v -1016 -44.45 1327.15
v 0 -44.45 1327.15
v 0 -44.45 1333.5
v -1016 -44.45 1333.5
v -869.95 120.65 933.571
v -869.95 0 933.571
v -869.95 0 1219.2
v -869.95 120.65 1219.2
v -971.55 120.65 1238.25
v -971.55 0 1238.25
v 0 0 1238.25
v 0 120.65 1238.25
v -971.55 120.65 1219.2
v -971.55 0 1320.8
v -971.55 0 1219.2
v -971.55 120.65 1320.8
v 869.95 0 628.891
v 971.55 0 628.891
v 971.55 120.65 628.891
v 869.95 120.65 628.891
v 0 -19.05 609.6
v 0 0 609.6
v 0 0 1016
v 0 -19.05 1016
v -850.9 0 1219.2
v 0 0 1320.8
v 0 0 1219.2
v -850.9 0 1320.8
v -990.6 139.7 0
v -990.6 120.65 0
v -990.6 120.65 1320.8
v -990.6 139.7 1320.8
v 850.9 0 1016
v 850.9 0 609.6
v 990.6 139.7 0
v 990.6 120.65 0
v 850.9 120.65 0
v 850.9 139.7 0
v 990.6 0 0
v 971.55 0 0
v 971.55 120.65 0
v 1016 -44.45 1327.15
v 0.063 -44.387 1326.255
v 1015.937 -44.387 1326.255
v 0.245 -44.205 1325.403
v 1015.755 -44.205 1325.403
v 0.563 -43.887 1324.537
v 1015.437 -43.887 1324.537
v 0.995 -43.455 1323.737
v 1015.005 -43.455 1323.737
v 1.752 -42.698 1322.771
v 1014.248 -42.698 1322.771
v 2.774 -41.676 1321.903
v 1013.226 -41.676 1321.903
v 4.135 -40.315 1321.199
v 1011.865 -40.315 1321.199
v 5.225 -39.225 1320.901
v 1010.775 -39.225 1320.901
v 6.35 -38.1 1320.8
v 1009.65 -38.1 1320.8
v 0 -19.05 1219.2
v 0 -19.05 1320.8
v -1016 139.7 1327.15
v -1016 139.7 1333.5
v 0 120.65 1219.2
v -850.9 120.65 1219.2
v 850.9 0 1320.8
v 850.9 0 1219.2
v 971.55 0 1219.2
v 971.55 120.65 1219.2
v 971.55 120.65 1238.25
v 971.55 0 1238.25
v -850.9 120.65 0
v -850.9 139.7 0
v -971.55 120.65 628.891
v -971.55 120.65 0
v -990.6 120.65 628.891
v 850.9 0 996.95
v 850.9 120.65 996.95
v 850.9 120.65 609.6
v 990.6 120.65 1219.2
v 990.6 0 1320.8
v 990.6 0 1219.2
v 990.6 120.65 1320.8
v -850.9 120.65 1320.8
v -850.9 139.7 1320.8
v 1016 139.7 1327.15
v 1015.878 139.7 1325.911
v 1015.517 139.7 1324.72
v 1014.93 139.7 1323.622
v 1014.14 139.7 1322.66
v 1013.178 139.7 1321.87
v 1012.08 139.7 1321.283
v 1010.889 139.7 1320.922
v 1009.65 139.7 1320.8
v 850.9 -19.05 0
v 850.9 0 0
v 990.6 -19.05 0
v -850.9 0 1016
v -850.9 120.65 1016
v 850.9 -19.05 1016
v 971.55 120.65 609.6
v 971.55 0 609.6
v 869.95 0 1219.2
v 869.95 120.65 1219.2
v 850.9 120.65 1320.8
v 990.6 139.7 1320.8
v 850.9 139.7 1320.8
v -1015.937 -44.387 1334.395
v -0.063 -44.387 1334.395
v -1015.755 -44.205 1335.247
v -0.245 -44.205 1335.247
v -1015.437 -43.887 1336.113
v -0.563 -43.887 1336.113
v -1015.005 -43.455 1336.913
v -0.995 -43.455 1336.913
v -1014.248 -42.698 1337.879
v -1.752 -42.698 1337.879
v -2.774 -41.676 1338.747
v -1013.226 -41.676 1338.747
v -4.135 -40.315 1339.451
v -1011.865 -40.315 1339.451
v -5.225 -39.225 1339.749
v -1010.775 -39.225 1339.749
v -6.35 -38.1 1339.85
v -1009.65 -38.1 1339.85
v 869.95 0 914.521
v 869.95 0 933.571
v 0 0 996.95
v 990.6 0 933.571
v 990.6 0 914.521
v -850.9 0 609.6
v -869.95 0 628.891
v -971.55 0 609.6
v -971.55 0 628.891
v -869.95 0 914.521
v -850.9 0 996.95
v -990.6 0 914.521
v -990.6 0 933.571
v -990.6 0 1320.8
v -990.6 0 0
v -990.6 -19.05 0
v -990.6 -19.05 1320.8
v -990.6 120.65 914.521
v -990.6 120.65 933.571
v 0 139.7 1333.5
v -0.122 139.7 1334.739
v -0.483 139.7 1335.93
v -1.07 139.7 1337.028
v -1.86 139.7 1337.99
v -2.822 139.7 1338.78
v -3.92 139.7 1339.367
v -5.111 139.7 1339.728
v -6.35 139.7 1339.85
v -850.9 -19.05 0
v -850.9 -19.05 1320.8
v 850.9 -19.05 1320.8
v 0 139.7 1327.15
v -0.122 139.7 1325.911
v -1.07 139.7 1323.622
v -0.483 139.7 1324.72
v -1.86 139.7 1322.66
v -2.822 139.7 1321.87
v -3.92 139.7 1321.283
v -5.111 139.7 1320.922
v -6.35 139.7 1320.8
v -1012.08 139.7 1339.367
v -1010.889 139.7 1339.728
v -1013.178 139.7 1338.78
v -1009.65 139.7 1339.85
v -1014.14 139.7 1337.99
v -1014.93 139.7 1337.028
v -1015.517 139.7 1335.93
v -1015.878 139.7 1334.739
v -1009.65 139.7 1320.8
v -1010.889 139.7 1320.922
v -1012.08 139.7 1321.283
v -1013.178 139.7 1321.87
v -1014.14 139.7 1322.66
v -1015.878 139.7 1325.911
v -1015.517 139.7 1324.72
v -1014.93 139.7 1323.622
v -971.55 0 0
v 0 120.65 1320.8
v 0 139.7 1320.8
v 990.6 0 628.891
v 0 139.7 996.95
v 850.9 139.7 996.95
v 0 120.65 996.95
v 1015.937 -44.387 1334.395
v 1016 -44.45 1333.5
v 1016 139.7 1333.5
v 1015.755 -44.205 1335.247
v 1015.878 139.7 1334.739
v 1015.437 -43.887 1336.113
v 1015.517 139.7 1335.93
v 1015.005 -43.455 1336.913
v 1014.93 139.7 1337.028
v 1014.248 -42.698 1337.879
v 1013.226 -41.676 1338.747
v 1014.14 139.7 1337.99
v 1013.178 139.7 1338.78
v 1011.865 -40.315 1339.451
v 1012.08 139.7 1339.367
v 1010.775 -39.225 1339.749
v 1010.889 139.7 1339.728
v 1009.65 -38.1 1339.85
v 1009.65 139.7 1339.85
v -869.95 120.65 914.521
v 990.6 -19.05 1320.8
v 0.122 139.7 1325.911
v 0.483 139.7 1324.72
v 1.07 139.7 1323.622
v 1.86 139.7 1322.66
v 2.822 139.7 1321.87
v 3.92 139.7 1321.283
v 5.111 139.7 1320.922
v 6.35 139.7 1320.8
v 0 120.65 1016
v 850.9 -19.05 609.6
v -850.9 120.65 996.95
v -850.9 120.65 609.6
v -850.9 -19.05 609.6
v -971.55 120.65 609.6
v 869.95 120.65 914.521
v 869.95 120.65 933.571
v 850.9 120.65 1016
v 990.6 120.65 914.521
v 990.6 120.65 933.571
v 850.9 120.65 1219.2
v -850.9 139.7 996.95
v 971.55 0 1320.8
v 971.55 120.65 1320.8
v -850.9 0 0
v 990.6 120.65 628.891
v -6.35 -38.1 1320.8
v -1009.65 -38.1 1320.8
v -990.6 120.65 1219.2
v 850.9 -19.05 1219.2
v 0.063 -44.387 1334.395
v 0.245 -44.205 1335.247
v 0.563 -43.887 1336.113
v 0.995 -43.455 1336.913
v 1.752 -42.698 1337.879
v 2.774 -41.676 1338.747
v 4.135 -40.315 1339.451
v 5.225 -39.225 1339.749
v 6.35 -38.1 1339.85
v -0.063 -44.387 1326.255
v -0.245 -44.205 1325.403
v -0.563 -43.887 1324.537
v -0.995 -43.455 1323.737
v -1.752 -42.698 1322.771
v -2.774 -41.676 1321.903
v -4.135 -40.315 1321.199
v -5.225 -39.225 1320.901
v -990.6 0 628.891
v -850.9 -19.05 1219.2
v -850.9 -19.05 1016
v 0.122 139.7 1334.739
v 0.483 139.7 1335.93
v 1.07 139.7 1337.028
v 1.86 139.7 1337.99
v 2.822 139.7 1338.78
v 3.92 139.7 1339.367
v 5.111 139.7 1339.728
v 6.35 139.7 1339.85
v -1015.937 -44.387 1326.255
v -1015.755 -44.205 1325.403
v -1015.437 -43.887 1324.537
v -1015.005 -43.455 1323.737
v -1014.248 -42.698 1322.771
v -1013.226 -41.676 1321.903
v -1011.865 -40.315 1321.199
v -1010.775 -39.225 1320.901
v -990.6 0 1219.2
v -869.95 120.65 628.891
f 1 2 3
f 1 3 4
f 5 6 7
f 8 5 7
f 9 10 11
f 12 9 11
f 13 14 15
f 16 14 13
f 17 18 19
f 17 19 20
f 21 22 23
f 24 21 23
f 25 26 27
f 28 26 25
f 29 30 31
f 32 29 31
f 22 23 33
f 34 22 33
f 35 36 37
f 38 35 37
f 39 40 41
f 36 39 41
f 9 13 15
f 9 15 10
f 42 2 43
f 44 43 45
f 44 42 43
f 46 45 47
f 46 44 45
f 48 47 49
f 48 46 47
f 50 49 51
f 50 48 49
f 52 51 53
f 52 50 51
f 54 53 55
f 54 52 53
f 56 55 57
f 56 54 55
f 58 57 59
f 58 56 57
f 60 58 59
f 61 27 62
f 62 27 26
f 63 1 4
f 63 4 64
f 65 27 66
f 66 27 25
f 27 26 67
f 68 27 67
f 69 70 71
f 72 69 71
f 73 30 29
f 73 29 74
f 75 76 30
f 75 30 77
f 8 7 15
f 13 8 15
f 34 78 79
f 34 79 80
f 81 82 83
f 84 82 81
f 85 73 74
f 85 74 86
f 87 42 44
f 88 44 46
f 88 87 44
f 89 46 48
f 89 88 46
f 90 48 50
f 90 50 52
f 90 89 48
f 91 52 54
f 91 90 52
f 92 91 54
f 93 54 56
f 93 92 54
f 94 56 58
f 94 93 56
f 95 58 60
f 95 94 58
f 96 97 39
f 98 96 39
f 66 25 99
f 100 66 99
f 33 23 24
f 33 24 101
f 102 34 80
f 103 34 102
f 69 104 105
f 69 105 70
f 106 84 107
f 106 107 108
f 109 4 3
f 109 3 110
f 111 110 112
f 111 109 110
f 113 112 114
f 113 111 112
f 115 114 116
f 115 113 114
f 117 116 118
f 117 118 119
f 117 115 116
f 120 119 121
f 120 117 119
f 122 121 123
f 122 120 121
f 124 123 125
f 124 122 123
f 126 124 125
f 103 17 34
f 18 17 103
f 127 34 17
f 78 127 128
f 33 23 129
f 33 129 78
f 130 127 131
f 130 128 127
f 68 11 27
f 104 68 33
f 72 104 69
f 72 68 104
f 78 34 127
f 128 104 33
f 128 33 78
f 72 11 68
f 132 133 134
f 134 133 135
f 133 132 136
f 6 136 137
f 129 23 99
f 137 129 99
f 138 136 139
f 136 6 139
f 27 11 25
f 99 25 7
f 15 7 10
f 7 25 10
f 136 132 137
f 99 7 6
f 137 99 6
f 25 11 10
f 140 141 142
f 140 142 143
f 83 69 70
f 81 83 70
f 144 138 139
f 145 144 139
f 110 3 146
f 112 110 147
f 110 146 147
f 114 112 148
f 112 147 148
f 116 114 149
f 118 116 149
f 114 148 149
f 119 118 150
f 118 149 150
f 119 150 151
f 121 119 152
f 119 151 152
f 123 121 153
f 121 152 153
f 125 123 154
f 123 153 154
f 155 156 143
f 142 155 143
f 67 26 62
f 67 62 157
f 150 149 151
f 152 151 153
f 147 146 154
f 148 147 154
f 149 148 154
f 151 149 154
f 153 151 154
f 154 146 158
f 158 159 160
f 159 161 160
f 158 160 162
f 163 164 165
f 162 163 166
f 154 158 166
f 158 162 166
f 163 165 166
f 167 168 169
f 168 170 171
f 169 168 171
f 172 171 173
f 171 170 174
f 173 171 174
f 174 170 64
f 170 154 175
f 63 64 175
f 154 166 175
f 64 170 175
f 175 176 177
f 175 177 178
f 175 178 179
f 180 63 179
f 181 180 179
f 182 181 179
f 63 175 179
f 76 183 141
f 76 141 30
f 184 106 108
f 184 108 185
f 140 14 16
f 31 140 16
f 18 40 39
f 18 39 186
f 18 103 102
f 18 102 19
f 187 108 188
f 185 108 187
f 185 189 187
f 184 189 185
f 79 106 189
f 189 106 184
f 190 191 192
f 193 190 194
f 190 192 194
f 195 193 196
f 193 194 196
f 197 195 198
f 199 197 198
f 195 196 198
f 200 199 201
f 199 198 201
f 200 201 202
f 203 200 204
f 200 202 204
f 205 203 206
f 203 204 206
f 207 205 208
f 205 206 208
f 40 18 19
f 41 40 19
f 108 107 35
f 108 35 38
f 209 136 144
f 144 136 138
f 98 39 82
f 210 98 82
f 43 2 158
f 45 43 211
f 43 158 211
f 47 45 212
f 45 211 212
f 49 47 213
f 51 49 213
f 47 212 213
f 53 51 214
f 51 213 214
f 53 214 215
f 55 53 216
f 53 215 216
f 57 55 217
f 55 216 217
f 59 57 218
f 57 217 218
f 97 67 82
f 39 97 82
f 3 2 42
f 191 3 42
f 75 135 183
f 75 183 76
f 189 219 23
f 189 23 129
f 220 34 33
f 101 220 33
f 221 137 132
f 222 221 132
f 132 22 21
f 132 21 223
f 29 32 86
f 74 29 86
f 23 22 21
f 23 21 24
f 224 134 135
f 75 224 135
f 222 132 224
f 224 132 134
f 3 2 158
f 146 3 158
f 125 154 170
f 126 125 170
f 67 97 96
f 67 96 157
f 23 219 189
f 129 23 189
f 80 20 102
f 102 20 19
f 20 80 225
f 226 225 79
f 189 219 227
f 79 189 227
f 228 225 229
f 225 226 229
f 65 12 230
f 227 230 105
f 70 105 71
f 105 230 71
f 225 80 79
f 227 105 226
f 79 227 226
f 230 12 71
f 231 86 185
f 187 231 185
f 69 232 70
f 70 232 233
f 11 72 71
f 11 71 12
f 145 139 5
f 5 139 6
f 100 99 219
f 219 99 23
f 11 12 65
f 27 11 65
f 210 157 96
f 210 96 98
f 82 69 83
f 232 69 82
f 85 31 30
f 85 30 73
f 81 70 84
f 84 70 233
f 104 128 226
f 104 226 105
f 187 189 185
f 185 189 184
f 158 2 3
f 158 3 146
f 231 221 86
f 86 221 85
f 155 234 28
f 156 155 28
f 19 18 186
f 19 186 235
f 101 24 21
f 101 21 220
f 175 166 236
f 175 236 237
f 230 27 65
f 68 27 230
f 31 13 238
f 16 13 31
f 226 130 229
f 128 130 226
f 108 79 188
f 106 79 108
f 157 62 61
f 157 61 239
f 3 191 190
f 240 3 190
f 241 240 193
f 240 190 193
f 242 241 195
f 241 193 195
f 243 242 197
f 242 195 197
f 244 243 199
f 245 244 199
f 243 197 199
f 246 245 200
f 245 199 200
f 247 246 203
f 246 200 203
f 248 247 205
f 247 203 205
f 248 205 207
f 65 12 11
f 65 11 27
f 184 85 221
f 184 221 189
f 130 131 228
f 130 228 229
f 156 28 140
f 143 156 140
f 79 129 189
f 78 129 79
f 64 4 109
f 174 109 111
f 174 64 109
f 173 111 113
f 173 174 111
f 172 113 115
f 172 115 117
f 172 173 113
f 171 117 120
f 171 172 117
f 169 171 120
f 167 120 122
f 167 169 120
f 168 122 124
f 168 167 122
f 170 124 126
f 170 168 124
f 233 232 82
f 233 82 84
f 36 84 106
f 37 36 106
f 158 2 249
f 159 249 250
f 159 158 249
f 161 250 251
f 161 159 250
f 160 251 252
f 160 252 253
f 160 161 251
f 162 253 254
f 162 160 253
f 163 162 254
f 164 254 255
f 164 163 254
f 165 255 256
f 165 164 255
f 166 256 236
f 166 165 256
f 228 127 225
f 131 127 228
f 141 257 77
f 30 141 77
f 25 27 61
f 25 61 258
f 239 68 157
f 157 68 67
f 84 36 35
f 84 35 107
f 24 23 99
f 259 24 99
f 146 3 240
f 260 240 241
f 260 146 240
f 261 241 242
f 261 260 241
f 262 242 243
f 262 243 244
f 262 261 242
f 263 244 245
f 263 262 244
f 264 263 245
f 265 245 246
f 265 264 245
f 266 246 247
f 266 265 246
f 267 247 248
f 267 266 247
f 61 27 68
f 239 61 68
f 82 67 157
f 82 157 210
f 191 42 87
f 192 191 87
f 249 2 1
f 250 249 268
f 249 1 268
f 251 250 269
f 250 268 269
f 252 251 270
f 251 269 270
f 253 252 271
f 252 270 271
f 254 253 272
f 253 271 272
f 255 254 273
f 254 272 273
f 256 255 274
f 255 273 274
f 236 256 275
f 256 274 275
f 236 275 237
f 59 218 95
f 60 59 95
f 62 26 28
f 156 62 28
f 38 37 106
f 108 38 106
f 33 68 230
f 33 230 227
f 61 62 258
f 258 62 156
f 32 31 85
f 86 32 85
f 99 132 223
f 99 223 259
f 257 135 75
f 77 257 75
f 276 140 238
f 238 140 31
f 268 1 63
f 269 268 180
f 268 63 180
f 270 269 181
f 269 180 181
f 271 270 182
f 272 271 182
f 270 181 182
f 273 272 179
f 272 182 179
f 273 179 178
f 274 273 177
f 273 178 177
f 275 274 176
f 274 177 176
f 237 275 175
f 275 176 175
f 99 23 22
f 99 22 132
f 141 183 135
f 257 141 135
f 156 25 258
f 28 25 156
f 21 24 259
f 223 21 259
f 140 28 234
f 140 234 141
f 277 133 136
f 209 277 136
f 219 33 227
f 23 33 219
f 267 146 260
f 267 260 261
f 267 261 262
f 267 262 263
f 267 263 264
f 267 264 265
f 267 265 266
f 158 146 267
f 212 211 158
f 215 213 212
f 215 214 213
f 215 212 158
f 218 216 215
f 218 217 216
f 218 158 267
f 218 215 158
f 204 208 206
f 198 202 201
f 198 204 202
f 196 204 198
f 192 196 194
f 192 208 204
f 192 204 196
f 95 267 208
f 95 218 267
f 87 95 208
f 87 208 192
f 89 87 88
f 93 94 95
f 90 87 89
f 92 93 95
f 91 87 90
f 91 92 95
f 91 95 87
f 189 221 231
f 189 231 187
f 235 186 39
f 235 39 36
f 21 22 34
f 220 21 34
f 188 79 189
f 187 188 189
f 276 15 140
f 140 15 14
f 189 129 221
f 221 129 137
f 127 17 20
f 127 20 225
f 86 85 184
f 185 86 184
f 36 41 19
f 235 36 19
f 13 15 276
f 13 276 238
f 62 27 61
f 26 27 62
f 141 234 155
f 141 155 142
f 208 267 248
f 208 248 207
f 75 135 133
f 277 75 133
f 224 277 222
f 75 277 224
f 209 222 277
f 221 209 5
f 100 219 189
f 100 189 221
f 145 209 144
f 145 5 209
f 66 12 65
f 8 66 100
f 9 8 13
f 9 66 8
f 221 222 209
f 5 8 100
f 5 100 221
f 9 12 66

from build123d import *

# Parameters (mm, degrees)
F0_W      = 139.7
F0_H      = 1320.8
F1_DEPTH  = 19.05
F2_W      = 850.9
F2_H      = 406.4
F3_DEPTH  = 19.05
F5_DEPTH  = 120.65
F6_W      = 850.9
F6_H      = 101.6
F7_DEPTH  = 19.05
F8_W      = 850.9
F8_H      = 323.85
F9_DEPTH  = 19.05
F10_W     = 120.65
F10_H     = 101.6
F10_H_2   = 628.89129
F11_DEPTH = 19.05
F12_W     = 139.7
F12_H     = 1320.8
F13_DEPTH = 19.05
F14_W     = 1016
F14_H     = 184.15
F15_DEPTH = 19.05
F16_R     = 6.35


with BuildPart() as f1:
    # F0 (on Front) → F1 (new body)
    with BuildSketch(Plane.XZ):
        with Locations((920.75, 660.4)):
            Rectangle(F0_W, F0_H)
    extrude(amount=F1_DEPTH)


with BuildPart() as f3:
    # F2 (on Front) → F3 (new body)
    with BuildSketch(Plane.XZ):
        with Locations((425.45, 812.8)):
            Rectangle(F2_W, F2_H)
    extrude(amount=F3_DEPTH)


with BuildPart() as f5:
    # F4 (on Front) → F5 (new body)
    with BuildSketch(Plane.XZ):
        Polygon((850.9, 1016), (0, 1016), (0, 996.95), (850.9, 996.95), (850.9, 609.6), (869.95, 609.6), (971.55, 609.6), (971.55, 628.89129), (869.95, 628.89129), (869.95, 914.520645), (990.6, 914.520645), (990.6, 933.570645), (869.95, 933.570645), (869.95, 1219.2), (971.55, 1219.2), (971.55, 1238.25), (869.95, 1238.25), (0, 1238.25), (0, 1219.2), (850.9, 1219.2), align=None)
    extrude(amount=-F5_DEPTH)


with BuildPart() as f7:
    # F6 (on face) → F7 (new body)
    with BuildSketch(Plane.XZ):
        with Locations((425.45, 1270)):
            Rectangle(F6_W, F6_H)
    extrude(amount=F7_DEPTH)


with BuildPart() as f9:
    # F8 (on face) → F9 (new body)
    with BuildSketch(Plane(origin=(0, 120.65, 0), x_dir=(-1, 0, 0), z_dir=(0, 1, 0))):
        with Locations((-425.45, 1158.875)):
            Rectangle(F8_W, F8_H)
    extrude(amount=F9_DEPTH)


with BuildPart() as f11:
    # F10 (on face) → F11 (new body)
    with BuildSketch(Plane.YZ.offset(971.55)):
        with Locations((60.325, 1270)):
            Rectangle(F10_W, F10_H)
        with Locations((60.325, 314.445645)):
            Rectangle(F10_W, F10_H_2)
    extrude(amount=F11_DEPTH)


with BuildPart() as f13:
    # F12 (on face) → F13 (new body)
    with BuildSketch(Plane(origin=(0, 120.65, 0), x_dir=(-1, 0, 0), z_dir=(0, 1, 0))):
        with Locations((-920.75, 660.4)):
            Rectangle(F12_W, F12_H)
    extrude(amount=F13_DEPTH)


with BuildPart() as f15:
    # F14 (on face) → F15 (new body)
    with BuildSketch(Plane.XY.offset(1320.8)):
        with Locations((508, 47.625)):
            Rectangle(F14_W, F14_H)
    extrude(amount=F15_DEPTH)

    # F16
    f16_edges = [f15.edges().sort_by_distance(p)[0] for p in [
        (1016, 47.625, 1339.85),
        (508, -44.45, 1339.85),
        (508, -44.45, 1320.8),
        (1016, 47.625, 1320.8),
        (0, 47.625, 1339.85),
        (0, 47.625, 1320.8),
    ]]
    fillet(f16_edges, radius=F16_R)


with BuildPart() as f17_1:
    # F17: instance of F15
    add(f15.part.mirror(Plane.YZ))


with BuildPart() as f17_2:
    # F17: instance of F1
    add(f1.part.mirror(Plane.YZ))


with BuildPart() as f17_3:
    # F17: instance of F3
    add(f3.part.mirror(Plane.YZ))


with BuildPart() as f17_4:
    # F17: instance of F5
    add(f5.part.mirror(Plane.YZ))


with BuildPart() as f17_5:
    # F17: instance of F7
    add(f7.part.mirror(Plane.YZ))


with BuildPart() as f17_6:
    # F17: instance of F9
    add(f9.part.mirror(Plane.YZ))


with BuildPart() as f17_7:
    # F17: instance of F11
    add(f11.part.mirror(Plane.YZ))


with BuildPart() as f17_8:
    # F17: instance of F13
    add(f13.part.mirror(Plane.YZ))


solid = Compound([f1.part, f3.part, f5.part, f7.part, f9.part, f11.part, f13.part, f15.part, f17_1.part, f17_2.part, f17_3.part, f17_4.part, f17_5.part, f17_6.part, f17_7.part, f17_8.part])
